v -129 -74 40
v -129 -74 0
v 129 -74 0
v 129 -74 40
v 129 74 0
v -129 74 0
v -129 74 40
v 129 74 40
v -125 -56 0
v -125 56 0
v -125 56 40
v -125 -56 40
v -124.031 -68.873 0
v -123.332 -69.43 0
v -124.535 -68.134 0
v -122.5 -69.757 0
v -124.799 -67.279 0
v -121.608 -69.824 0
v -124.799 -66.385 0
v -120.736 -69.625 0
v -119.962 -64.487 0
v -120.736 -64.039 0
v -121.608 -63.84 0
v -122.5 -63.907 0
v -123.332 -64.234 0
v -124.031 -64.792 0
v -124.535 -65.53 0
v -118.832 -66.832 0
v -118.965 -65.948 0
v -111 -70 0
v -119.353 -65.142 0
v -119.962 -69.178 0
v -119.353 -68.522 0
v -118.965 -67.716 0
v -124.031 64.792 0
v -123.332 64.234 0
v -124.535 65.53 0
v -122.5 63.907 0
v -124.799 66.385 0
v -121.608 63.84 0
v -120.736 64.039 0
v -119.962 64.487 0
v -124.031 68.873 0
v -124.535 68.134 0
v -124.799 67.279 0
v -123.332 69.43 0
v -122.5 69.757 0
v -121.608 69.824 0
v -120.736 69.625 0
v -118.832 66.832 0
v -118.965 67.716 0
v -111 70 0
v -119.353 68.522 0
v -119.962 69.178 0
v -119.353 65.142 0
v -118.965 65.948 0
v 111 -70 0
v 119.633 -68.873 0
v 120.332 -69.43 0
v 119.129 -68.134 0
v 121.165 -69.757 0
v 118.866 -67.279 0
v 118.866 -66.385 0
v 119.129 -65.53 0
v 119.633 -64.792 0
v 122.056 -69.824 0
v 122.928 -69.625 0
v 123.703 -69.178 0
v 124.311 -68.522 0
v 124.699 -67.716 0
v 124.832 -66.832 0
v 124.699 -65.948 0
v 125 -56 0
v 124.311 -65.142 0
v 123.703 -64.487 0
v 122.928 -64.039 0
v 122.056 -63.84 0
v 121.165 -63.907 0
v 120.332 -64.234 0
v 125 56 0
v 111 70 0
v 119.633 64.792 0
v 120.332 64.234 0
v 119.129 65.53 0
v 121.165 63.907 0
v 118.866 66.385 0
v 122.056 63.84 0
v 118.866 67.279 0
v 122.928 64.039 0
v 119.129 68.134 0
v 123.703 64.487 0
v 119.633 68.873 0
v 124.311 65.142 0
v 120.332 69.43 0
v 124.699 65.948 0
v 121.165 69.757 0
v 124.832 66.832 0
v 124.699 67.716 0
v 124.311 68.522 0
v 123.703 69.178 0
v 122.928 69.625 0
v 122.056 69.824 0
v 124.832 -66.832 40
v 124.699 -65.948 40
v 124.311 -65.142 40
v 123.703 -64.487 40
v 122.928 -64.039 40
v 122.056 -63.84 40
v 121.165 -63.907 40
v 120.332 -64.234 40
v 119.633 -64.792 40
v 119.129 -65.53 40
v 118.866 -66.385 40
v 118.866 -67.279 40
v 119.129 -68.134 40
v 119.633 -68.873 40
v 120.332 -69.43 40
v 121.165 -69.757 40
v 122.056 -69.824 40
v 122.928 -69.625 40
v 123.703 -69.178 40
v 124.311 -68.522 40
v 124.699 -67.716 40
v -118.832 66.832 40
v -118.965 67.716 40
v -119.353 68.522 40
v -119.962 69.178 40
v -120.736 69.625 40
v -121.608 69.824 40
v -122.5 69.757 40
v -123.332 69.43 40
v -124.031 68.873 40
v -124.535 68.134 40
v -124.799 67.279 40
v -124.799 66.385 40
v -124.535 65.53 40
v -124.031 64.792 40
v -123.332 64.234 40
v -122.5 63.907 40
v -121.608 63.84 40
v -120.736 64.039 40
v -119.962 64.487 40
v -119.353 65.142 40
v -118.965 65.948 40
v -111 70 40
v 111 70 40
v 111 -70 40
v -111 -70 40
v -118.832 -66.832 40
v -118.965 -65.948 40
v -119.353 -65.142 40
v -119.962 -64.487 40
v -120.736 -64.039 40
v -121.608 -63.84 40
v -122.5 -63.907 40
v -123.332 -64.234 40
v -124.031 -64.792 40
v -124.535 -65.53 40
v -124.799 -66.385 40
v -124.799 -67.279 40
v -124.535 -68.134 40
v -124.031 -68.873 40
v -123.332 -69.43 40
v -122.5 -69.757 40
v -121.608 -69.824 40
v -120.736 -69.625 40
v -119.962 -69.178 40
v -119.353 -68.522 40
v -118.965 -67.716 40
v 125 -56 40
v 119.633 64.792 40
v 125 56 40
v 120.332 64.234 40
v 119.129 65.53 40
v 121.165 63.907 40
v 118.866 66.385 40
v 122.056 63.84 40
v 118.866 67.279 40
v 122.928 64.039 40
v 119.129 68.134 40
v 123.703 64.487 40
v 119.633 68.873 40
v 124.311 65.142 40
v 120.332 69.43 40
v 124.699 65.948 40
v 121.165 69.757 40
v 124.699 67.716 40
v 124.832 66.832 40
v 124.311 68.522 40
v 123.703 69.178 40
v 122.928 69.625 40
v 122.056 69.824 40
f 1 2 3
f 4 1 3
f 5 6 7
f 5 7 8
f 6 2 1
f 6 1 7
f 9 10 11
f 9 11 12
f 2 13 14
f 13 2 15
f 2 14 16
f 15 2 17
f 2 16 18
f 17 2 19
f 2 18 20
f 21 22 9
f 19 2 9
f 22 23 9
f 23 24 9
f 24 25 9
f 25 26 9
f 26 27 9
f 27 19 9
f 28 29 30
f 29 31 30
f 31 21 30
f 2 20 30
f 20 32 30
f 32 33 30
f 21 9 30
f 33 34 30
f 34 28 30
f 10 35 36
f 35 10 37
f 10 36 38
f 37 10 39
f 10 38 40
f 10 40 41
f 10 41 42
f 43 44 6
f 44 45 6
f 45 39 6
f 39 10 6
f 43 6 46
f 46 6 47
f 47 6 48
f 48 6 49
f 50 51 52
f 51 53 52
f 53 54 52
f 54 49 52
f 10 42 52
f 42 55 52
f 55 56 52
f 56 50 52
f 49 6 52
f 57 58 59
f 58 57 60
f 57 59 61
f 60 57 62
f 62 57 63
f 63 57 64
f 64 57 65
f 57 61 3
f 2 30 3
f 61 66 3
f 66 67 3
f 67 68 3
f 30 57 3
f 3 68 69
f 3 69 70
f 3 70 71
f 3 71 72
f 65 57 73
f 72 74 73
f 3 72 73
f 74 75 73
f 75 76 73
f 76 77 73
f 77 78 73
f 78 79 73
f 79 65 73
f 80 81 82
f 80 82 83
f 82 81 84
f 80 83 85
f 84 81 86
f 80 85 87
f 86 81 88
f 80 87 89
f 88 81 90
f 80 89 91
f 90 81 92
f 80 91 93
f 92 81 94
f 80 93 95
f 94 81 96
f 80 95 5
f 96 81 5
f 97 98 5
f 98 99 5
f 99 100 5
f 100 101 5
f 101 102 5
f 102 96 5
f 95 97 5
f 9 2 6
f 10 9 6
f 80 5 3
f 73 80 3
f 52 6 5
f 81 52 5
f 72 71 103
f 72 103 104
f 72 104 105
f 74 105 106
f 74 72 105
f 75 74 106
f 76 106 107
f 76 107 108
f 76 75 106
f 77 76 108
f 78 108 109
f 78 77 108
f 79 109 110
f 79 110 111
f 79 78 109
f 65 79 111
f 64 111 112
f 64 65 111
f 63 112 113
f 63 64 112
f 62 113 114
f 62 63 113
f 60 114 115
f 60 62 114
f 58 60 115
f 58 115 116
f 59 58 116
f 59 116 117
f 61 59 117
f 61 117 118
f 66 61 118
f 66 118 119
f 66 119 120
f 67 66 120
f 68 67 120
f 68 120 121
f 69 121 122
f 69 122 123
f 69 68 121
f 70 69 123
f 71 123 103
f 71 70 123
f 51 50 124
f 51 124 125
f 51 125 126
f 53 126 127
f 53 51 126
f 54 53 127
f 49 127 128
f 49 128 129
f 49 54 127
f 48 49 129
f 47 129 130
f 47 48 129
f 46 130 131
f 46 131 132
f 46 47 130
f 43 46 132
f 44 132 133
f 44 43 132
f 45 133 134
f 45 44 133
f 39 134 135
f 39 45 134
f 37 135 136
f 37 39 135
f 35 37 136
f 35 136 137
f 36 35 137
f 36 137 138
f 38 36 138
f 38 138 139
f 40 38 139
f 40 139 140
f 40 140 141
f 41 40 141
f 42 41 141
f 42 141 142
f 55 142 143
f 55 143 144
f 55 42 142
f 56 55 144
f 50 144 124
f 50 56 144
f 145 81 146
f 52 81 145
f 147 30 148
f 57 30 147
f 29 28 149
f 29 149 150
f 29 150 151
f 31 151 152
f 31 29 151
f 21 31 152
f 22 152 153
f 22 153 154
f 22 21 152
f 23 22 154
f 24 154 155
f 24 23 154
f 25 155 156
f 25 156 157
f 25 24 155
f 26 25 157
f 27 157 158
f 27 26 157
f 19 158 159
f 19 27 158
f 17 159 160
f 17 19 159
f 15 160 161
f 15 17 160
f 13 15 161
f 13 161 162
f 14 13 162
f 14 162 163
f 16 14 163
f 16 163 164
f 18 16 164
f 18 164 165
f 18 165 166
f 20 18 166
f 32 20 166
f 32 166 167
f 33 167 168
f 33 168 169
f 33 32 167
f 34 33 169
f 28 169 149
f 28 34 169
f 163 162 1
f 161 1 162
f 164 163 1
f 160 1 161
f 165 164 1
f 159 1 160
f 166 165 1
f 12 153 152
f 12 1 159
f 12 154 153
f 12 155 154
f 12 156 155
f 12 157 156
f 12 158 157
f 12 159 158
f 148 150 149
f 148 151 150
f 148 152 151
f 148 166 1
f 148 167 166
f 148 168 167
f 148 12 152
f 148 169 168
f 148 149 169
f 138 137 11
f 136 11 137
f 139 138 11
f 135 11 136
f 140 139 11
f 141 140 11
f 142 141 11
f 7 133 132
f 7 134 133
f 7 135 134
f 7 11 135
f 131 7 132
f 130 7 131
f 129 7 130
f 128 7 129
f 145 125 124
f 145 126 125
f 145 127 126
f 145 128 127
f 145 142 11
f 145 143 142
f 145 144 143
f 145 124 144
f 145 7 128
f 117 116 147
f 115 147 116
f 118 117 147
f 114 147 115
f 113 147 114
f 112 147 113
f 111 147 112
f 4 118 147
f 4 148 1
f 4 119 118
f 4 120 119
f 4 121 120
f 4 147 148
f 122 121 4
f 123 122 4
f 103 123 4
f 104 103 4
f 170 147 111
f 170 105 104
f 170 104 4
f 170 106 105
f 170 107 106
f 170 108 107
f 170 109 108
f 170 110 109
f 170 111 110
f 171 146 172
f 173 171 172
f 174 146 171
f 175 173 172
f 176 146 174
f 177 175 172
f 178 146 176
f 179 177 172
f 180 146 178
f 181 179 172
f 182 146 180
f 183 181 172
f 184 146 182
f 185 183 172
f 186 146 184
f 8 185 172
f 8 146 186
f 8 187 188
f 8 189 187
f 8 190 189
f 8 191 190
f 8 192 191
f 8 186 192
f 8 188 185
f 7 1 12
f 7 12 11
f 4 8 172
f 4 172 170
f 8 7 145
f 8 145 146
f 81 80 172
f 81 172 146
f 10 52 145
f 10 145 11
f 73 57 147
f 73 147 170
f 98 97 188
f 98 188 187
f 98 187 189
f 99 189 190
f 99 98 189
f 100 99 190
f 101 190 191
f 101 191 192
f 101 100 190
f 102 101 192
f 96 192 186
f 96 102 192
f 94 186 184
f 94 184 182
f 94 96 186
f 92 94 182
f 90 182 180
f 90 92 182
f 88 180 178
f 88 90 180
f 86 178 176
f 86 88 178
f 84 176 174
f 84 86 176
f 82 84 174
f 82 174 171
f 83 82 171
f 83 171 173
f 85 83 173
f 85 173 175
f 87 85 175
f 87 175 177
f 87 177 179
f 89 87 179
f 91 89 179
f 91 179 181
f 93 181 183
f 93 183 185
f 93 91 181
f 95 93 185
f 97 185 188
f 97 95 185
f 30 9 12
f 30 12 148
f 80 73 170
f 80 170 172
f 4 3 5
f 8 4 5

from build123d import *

# Parameters (mm, degrees)
ESQUISSE1_W        = 258
ESQUISSE1_H        = 148
ESQUISSE1_R        = 3
BOSS_EXTRU_2_DEPTH = 40


with BuildPart() as part:
    # Esquisse1 → Boss.-Extru.2 (new body)
    with BuildSketch(Plane.XY):
        Rectangle(ESQUISSE1_W, ESQUISSE1_H)
        with Locations((-121.832077187, -66.832077187)):
            Circle(ESQUISSE1_R, mode=Mode.SUBTRACT)
        with Locations((-121.832077187, 66.832077187)):
            Circle(ESQUISSE1_R, mode=Mode.SUBTRACT)
        with Locations((121.832077187, -66.832077187)):
            Circle(ESQUISSE1_R, mode=Mode.SUBTRACT)
        with Locations((121.832077187, 66.832077187)):
            Circle(ESQUISSE1_R, mode=Mode.SUBTRACT)
        Polygon((-111, -70), (111, -70), (125, -56), (125, 56), (111, 70), (-111, 70), (-125, 56), (-125, -56), align=None, mode=Mode.SUBTRACT)
    extrude(amount=BOSS_EXTRU_2_DEPTH)


solid = part.part
